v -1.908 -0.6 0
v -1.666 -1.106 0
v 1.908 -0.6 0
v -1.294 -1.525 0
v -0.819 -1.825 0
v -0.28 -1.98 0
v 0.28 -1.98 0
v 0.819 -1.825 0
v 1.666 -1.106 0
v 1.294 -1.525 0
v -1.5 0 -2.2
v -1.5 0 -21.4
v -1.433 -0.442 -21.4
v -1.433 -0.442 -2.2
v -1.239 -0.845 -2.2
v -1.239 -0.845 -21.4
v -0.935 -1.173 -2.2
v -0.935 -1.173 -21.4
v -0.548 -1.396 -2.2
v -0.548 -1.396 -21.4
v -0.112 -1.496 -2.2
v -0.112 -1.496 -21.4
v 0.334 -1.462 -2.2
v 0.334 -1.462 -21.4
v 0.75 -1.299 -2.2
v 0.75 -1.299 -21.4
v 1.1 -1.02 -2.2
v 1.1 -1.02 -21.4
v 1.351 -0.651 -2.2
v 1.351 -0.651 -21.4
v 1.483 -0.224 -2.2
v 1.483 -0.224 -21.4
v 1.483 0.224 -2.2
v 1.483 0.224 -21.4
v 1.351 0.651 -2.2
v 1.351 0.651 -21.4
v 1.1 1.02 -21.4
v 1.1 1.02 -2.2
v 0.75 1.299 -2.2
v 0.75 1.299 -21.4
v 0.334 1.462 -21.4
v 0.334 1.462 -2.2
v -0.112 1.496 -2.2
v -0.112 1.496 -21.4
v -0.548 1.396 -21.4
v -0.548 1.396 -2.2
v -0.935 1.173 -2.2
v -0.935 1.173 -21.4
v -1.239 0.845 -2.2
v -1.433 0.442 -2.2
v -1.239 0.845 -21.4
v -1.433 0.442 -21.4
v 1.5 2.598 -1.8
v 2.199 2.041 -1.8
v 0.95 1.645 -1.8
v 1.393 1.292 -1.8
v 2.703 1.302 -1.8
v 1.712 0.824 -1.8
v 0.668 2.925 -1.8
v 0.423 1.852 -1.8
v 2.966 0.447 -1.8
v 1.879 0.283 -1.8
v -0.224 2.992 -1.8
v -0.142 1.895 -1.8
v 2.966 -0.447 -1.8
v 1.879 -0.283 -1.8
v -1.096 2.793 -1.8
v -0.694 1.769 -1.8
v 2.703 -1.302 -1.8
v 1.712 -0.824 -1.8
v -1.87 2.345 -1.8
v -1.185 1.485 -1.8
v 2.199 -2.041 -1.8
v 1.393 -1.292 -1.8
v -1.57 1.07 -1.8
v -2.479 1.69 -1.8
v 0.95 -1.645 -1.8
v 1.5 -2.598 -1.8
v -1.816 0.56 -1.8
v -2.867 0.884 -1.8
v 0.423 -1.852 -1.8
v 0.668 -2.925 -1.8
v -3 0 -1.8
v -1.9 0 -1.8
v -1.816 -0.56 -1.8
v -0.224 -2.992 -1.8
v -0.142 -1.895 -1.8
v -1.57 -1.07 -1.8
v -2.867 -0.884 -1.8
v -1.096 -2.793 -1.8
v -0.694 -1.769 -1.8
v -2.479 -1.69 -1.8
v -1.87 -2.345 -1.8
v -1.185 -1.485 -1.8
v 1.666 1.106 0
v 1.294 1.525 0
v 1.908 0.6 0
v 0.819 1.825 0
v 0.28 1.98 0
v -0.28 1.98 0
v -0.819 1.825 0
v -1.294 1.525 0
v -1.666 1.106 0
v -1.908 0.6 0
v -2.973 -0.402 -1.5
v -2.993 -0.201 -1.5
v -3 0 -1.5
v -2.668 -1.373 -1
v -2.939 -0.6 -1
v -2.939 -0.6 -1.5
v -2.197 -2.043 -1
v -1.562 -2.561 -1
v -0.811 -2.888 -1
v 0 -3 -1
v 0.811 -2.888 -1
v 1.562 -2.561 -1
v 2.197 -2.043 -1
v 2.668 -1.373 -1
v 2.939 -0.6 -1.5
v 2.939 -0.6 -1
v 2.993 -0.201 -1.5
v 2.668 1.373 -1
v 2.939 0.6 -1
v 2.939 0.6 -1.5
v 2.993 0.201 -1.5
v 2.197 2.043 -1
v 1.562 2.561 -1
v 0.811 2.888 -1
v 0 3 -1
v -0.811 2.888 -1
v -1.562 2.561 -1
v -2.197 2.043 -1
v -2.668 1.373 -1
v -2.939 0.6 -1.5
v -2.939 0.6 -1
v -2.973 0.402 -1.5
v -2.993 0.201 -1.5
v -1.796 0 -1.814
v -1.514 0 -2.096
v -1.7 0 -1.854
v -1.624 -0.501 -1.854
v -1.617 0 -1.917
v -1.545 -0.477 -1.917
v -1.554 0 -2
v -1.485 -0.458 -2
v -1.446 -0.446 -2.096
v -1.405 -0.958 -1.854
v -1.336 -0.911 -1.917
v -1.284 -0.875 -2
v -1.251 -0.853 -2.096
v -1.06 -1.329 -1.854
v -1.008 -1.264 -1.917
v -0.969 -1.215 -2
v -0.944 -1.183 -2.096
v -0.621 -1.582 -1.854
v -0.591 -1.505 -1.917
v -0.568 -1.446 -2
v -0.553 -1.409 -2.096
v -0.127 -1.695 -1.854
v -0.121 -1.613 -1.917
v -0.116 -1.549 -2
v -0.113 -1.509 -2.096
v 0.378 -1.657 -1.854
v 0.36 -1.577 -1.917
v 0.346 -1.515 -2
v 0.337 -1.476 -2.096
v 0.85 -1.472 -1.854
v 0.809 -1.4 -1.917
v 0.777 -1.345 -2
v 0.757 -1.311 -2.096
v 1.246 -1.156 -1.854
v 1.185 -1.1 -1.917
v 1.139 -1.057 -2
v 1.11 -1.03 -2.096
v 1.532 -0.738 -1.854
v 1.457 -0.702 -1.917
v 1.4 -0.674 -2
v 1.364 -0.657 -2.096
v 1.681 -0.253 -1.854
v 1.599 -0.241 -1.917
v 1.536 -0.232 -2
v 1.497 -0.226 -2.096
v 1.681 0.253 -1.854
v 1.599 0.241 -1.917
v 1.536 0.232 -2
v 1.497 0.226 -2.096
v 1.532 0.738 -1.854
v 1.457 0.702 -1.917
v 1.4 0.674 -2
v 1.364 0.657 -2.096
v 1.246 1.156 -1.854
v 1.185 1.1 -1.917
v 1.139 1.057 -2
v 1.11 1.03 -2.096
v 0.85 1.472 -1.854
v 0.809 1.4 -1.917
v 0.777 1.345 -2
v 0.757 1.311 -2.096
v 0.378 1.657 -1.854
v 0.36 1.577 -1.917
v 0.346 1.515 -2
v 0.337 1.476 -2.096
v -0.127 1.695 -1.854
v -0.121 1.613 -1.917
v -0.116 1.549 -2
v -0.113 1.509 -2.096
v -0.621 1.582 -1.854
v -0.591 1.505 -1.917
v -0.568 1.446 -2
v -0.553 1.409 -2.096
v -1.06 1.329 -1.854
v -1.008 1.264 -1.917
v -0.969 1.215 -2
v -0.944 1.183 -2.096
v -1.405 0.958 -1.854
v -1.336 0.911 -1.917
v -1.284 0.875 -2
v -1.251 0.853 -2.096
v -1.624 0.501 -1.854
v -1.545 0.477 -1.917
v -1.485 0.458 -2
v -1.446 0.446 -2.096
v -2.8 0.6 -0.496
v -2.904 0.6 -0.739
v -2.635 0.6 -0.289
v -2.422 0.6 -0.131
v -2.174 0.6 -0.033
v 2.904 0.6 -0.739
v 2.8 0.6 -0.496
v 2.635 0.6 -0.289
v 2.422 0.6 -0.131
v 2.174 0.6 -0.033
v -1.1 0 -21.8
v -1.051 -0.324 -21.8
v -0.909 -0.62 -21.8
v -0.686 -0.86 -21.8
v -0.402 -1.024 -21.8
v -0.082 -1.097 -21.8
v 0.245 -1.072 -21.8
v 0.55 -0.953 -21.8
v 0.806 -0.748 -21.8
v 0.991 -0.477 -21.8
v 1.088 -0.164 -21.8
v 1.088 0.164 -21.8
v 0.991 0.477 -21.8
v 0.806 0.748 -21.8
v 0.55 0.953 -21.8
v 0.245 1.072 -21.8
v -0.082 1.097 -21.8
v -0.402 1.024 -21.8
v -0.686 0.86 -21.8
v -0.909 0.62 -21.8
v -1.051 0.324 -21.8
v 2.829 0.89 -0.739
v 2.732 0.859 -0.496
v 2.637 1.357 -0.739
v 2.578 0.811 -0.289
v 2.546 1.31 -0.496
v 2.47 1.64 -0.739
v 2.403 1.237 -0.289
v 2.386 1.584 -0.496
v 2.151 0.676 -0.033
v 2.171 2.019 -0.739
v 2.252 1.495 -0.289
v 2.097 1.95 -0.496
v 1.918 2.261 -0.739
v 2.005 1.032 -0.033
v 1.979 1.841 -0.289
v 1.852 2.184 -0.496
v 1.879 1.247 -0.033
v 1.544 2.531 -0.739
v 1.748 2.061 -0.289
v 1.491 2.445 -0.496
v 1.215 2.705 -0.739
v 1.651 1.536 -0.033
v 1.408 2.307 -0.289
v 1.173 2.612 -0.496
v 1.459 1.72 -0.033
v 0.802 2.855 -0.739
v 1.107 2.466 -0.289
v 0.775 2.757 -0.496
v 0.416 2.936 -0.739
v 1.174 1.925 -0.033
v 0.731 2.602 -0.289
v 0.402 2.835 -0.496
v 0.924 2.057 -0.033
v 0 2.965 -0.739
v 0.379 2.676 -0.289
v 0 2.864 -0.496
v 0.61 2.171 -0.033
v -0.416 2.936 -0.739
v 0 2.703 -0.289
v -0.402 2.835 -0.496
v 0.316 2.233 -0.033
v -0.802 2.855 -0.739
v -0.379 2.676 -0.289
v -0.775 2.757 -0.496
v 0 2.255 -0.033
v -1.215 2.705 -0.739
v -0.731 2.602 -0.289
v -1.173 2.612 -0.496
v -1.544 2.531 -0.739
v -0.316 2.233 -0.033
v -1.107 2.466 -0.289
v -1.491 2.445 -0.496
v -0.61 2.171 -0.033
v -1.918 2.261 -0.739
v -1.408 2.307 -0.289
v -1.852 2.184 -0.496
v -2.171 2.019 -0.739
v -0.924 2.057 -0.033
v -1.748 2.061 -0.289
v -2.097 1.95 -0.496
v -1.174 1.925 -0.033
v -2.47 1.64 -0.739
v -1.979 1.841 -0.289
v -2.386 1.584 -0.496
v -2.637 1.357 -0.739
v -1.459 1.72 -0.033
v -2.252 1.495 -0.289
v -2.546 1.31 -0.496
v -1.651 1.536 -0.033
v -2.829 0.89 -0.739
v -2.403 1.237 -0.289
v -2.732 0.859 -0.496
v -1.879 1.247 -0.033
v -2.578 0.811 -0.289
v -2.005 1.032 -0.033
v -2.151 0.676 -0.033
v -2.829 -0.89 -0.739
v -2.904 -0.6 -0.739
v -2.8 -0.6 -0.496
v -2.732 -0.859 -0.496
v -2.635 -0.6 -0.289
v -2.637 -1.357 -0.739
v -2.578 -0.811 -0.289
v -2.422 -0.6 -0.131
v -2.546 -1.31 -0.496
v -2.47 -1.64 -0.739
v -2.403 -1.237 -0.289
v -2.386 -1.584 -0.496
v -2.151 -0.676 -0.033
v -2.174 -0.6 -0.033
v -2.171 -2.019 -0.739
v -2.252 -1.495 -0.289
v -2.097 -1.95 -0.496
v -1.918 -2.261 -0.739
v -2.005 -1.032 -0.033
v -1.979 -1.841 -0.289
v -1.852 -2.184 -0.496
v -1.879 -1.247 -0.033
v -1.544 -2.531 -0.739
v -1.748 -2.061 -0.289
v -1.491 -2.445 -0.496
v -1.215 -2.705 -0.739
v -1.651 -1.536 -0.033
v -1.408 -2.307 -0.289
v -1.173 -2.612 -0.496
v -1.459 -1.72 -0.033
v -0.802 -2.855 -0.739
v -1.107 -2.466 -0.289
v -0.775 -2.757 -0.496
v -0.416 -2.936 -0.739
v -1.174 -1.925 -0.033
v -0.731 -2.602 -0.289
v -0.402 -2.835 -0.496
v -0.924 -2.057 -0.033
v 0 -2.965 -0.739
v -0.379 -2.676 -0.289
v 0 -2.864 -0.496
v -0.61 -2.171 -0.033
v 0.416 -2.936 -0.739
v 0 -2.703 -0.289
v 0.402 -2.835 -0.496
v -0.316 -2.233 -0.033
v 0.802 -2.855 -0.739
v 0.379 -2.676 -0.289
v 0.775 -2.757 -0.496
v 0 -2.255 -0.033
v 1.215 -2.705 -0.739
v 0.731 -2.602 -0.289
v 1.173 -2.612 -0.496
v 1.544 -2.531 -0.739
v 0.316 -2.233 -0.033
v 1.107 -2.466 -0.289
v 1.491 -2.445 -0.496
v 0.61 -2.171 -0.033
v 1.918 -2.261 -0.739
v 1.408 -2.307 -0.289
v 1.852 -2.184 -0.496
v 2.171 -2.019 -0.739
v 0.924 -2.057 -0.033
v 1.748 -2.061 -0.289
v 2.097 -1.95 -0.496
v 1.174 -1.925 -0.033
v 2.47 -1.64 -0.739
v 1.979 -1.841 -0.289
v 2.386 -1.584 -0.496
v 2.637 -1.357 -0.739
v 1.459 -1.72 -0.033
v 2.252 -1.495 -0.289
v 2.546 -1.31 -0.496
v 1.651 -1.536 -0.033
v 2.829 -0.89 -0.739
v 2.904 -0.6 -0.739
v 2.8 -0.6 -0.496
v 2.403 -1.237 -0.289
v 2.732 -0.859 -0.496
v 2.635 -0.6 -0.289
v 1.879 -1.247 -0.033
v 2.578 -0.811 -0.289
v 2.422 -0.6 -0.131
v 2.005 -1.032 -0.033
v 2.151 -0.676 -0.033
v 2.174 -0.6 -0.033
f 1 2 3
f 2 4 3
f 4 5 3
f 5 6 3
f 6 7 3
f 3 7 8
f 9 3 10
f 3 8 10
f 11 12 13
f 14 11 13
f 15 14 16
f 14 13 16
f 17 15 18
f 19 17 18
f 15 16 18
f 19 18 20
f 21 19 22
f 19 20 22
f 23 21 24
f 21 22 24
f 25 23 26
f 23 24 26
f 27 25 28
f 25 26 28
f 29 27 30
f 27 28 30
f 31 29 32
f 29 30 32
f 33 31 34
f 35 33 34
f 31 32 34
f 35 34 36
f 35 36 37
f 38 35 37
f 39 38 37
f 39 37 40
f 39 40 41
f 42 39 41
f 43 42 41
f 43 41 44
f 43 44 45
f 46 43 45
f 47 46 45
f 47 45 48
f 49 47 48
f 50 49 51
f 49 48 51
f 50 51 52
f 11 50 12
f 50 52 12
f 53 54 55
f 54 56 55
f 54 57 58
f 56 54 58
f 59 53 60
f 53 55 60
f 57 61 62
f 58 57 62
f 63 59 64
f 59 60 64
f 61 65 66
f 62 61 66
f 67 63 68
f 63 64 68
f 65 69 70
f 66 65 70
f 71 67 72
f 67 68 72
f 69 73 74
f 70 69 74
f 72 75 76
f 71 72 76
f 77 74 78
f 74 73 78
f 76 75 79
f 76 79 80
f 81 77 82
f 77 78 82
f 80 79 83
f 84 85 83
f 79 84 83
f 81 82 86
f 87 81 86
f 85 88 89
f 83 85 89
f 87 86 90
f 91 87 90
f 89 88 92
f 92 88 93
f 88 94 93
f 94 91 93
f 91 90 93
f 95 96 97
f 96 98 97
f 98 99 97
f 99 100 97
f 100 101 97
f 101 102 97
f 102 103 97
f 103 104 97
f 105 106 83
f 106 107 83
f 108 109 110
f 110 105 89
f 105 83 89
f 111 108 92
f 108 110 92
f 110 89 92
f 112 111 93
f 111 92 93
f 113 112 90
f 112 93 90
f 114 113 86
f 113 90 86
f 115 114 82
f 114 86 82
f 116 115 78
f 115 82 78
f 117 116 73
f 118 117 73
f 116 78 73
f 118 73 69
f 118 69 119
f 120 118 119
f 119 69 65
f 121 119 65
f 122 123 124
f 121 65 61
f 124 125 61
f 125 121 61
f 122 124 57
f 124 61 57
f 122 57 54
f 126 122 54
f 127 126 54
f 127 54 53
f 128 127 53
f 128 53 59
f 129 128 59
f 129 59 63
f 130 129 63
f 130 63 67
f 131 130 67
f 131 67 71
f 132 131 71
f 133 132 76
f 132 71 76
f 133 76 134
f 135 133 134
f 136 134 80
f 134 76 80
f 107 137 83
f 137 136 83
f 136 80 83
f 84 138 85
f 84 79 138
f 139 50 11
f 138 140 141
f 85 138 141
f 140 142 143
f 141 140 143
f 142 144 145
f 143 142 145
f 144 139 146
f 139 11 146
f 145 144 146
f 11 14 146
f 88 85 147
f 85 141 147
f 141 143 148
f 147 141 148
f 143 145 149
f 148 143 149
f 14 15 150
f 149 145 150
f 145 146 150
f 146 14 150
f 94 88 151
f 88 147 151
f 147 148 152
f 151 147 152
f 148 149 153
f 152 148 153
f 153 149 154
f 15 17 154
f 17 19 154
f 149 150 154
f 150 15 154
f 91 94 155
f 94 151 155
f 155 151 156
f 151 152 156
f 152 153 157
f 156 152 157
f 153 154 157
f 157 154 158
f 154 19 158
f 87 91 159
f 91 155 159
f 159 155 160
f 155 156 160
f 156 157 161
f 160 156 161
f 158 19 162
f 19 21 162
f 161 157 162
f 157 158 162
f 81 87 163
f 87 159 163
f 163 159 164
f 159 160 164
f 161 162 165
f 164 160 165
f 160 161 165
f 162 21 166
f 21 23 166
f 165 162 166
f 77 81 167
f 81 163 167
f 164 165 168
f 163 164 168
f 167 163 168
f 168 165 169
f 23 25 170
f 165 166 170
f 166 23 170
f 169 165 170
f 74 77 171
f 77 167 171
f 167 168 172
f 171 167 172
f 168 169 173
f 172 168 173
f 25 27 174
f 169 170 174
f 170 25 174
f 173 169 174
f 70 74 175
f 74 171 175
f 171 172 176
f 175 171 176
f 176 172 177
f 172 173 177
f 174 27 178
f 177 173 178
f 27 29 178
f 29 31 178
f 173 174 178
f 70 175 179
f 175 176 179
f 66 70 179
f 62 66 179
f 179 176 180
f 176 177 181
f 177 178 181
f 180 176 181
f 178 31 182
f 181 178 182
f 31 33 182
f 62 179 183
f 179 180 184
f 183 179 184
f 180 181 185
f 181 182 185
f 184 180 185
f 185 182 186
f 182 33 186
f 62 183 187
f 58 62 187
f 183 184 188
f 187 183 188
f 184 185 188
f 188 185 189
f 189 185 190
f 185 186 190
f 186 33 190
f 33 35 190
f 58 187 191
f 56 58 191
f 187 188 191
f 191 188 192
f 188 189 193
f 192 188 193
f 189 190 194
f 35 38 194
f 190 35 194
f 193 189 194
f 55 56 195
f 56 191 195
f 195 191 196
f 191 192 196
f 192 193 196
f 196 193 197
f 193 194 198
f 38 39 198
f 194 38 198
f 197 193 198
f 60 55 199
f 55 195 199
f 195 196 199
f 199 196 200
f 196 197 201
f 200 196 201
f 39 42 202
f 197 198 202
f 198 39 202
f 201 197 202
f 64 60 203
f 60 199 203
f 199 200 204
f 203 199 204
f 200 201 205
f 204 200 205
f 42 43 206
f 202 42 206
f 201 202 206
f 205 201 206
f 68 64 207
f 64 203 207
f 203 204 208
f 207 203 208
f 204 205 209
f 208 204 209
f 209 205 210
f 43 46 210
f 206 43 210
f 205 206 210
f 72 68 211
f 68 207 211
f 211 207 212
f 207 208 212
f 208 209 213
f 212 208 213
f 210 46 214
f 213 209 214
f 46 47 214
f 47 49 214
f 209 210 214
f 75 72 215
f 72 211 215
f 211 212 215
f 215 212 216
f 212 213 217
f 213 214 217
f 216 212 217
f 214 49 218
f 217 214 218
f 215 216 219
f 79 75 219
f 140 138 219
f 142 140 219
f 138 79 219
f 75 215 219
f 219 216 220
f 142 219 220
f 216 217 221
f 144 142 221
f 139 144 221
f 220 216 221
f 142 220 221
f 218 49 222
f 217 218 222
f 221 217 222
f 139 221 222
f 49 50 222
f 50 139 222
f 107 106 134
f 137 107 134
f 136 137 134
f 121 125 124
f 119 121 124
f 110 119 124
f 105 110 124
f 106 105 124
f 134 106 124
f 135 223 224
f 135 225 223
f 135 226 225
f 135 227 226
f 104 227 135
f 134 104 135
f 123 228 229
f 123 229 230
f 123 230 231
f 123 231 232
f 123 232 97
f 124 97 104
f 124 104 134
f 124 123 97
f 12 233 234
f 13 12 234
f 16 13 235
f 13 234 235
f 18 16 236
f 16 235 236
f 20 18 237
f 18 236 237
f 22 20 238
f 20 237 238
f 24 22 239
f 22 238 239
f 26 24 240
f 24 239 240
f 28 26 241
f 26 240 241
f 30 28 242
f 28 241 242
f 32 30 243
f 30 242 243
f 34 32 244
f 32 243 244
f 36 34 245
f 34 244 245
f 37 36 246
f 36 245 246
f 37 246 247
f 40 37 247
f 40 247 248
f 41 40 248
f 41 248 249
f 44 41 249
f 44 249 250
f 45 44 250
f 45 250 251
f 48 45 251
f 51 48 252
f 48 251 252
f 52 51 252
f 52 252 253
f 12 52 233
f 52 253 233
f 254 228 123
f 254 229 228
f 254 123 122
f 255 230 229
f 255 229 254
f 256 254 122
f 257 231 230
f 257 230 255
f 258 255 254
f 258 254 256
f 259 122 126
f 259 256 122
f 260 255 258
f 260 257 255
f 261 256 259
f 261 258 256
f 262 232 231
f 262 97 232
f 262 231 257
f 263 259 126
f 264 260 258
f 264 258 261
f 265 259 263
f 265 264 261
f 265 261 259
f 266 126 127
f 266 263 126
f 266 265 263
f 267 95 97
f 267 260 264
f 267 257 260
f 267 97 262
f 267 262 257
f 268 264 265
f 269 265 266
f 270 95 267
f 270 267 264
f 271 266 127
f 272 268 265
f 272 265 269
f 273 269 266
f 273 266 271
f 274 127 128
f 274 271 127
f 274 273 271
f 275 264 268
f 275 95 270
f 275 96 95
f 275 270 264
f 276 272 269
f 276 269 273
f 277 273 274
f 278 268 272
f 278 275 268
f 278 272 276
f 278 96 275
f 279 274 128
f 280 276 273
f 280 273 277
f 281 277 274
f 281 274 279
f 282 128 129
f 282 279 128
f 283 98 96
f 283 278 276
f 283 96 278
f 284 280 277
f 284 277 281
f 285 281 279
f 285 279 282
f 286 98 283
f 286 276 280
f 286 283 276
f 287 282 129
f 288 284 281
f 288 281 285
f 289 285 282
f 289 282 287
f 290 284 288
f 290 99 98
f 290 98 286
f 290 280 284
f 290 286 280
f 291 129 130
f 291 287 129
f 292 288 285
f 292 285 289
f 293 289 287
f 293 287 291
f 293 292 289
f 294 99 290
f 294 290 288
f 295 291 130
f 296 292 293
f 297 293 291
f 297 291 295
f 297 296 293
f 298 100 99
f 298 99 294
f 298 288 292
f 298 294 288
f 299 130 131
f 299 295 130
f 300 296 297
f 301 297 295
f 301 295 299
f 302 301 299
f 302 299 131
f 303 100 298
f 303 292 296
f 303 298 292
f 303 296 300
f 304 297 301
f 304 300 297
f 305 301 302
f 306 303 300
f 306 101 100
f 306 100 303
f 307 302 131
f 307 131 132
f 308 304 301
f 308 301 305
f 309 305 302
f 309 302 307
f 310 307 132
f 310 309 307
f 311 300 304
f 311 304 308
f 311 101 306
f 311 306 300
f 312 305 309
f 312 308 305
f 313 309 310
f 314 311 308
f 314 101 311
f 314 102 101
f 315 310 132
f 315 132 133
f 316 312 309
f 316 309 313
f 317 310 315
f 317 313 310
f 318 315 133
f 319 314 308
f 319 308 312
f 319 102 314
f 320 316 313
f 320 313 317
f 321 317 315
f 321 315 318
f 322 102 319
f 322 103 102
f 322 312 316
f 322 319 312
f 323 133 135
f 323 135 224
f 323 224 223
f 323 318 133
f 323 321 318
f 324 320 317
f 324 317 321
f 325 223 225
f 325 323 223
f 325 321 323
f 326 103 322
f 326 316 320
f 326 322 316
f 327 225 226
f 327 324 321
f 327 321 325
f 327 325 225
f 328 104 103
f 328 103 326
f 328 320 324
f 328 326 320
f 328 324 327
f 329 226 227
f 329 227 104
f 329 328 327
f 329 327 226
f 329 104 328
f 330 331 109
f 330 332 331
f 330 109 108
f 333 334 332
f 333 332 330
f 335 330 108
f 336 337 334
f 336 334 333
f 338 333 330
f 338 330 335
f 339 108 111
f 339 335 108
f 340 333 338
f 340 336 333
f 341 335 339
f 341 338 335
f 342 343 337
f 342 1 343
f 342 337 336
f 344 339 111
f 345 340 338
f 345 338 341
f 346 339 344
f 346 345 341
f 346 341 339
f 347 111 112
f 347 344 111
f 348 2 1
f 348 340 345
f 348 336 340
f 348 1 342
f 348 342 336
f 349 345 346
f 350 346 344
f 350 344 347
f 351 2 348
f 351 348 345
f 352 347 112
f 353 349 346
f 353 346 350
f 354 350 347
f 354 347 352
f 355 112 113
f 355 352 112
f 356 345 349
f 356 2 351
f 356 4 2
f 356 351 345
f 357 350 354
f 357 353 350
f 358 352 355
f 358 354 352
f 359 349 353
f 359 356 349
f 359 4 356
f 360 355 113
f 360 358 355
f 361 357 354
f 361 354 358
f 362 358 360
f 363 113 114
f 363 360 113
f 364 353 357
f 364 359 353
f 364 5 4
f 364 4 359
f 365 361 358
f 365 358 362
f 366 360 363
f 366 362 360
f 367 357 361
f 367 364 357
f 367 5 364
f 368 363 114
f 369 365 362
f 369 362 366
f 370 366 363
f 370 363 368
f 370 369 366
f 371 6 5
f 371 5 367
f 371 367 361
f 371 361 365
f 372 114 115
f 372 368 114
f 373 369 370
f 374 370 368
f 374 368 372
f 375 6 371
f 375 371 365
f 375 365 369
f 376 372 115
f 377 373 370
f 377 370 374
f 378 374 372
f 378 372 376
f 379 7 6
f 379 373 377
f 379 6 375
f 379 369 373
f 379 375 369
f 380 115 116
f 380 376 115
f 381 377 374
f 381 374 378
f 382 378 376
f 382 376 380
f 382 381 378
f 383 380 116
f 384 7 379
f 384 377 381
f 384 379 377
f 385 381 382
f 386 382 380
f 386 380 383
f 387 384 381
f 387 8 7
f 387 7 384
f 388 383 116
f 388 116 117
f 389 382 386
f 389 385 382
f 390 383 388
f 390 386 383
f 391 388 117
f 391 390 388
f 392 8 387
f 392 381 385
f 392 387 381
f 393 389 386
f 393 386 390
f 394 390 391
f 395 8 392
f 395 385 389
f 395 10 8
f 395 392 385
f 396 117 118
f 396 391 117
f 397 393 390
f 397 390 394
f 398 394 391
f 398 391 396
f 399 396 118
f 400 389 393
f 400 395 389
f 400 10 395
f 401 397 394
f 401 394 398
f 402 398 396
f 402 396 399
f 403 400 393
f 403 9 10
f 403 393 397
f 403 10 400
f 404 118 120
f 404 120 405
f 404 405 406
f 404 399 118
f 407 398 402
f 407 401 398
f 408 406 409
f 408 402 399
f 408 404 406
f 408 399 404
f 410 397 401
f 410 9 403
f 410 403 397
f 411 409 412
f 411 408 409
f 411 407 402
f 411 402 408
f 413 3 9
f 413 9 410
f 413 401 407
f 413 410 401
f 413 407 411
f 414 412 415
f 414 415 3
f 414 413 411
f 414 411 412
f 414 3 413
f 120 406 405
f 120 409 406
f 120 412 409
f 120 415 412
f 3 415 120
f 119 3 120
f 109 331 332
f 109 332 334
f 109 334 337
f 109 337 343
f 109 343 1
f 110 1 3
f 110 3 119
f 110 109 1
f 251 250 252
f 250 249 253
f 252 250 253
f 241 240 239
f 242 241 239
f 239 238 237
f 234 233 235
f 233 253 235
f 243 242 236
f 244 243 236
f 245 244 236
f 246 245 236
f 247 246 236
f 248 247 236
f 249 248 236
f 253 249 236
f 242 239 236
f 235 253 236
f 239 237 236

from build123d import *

# Parameters (mm, degrees)
SKETCH_2_W               = 1.5
SKETCH_2_H               = 1.2
CUT_EXTRUDE_1_DEPTH      = 4
CUT_EXTRUDE_1_DEPTH_BACK = 4
CHAMFER_1_SIZE           = 0.4
FILLET_1_R               = 1
FILLET_2_R               = 0.4


with BuildPart() as part:
    # Эскиз1 → Повернуть1 (revolve)
    with BuildSketch(Plane(origin=(0, 0, 0), x_dir=(1, 0, 0), z_dir=(0, 1, 0))):
        Polygon((0, 0), (-3, 0), (-3, 1.8), (-1.5, 1.8), (-1.5, 21.8), (0, 21.8), align=None)
    revolve(axis=Axis((0, 0, -21.8), (0, 0, 1)))

    # Эскиз2 → Вырез-Вытянуть1 (cut, two sides)
    with BuildSketch(Plane(origin=(0, 0, 0), x_dir=(0, 0, -1), z_dir=(1, 0, 0))) as cut_extrude_1_sk:
        with Locations((0.75, 0)):
            Rectangle(SKETCH_2_W, SKETCH_2_H)
    extrude(amount=CUT_EXTRUDE_1_DEPTH, mode=Mode.SUBTRACT)
    extrude(cut_extrude_1_sk.sketch, amount=-CUT_EXTRUDE_1_DEPTH_BACK, mode=Mode.SUBTRACT)

    # Фаска1
    chamfer_1_edges = [part.edges().sort_by_distance(p)[0] for p in [
        (1.5, 0, -21.8),
    ]]
    chamfer(chamfer_1_edges, length=CHAMFER_1_SIZE)

    # Скругление1
    fillet_1_edges = [part.edges().sort_by_distance(p)[0] for p in [
        (0, 3, 0),
        (0, -3, 0),
    ]]
    fillet(fillet_1_edges, radius=FILLET_1_R)

    # Скругление2
    fillet_2_edges = [part.edges().sort_by_distance(p)[0] for p in [
        (1.5, 0, -1.8),
    ]]
    fillet(fillet_2_edges, radius=FILLET_2_R)


solid = part.part
